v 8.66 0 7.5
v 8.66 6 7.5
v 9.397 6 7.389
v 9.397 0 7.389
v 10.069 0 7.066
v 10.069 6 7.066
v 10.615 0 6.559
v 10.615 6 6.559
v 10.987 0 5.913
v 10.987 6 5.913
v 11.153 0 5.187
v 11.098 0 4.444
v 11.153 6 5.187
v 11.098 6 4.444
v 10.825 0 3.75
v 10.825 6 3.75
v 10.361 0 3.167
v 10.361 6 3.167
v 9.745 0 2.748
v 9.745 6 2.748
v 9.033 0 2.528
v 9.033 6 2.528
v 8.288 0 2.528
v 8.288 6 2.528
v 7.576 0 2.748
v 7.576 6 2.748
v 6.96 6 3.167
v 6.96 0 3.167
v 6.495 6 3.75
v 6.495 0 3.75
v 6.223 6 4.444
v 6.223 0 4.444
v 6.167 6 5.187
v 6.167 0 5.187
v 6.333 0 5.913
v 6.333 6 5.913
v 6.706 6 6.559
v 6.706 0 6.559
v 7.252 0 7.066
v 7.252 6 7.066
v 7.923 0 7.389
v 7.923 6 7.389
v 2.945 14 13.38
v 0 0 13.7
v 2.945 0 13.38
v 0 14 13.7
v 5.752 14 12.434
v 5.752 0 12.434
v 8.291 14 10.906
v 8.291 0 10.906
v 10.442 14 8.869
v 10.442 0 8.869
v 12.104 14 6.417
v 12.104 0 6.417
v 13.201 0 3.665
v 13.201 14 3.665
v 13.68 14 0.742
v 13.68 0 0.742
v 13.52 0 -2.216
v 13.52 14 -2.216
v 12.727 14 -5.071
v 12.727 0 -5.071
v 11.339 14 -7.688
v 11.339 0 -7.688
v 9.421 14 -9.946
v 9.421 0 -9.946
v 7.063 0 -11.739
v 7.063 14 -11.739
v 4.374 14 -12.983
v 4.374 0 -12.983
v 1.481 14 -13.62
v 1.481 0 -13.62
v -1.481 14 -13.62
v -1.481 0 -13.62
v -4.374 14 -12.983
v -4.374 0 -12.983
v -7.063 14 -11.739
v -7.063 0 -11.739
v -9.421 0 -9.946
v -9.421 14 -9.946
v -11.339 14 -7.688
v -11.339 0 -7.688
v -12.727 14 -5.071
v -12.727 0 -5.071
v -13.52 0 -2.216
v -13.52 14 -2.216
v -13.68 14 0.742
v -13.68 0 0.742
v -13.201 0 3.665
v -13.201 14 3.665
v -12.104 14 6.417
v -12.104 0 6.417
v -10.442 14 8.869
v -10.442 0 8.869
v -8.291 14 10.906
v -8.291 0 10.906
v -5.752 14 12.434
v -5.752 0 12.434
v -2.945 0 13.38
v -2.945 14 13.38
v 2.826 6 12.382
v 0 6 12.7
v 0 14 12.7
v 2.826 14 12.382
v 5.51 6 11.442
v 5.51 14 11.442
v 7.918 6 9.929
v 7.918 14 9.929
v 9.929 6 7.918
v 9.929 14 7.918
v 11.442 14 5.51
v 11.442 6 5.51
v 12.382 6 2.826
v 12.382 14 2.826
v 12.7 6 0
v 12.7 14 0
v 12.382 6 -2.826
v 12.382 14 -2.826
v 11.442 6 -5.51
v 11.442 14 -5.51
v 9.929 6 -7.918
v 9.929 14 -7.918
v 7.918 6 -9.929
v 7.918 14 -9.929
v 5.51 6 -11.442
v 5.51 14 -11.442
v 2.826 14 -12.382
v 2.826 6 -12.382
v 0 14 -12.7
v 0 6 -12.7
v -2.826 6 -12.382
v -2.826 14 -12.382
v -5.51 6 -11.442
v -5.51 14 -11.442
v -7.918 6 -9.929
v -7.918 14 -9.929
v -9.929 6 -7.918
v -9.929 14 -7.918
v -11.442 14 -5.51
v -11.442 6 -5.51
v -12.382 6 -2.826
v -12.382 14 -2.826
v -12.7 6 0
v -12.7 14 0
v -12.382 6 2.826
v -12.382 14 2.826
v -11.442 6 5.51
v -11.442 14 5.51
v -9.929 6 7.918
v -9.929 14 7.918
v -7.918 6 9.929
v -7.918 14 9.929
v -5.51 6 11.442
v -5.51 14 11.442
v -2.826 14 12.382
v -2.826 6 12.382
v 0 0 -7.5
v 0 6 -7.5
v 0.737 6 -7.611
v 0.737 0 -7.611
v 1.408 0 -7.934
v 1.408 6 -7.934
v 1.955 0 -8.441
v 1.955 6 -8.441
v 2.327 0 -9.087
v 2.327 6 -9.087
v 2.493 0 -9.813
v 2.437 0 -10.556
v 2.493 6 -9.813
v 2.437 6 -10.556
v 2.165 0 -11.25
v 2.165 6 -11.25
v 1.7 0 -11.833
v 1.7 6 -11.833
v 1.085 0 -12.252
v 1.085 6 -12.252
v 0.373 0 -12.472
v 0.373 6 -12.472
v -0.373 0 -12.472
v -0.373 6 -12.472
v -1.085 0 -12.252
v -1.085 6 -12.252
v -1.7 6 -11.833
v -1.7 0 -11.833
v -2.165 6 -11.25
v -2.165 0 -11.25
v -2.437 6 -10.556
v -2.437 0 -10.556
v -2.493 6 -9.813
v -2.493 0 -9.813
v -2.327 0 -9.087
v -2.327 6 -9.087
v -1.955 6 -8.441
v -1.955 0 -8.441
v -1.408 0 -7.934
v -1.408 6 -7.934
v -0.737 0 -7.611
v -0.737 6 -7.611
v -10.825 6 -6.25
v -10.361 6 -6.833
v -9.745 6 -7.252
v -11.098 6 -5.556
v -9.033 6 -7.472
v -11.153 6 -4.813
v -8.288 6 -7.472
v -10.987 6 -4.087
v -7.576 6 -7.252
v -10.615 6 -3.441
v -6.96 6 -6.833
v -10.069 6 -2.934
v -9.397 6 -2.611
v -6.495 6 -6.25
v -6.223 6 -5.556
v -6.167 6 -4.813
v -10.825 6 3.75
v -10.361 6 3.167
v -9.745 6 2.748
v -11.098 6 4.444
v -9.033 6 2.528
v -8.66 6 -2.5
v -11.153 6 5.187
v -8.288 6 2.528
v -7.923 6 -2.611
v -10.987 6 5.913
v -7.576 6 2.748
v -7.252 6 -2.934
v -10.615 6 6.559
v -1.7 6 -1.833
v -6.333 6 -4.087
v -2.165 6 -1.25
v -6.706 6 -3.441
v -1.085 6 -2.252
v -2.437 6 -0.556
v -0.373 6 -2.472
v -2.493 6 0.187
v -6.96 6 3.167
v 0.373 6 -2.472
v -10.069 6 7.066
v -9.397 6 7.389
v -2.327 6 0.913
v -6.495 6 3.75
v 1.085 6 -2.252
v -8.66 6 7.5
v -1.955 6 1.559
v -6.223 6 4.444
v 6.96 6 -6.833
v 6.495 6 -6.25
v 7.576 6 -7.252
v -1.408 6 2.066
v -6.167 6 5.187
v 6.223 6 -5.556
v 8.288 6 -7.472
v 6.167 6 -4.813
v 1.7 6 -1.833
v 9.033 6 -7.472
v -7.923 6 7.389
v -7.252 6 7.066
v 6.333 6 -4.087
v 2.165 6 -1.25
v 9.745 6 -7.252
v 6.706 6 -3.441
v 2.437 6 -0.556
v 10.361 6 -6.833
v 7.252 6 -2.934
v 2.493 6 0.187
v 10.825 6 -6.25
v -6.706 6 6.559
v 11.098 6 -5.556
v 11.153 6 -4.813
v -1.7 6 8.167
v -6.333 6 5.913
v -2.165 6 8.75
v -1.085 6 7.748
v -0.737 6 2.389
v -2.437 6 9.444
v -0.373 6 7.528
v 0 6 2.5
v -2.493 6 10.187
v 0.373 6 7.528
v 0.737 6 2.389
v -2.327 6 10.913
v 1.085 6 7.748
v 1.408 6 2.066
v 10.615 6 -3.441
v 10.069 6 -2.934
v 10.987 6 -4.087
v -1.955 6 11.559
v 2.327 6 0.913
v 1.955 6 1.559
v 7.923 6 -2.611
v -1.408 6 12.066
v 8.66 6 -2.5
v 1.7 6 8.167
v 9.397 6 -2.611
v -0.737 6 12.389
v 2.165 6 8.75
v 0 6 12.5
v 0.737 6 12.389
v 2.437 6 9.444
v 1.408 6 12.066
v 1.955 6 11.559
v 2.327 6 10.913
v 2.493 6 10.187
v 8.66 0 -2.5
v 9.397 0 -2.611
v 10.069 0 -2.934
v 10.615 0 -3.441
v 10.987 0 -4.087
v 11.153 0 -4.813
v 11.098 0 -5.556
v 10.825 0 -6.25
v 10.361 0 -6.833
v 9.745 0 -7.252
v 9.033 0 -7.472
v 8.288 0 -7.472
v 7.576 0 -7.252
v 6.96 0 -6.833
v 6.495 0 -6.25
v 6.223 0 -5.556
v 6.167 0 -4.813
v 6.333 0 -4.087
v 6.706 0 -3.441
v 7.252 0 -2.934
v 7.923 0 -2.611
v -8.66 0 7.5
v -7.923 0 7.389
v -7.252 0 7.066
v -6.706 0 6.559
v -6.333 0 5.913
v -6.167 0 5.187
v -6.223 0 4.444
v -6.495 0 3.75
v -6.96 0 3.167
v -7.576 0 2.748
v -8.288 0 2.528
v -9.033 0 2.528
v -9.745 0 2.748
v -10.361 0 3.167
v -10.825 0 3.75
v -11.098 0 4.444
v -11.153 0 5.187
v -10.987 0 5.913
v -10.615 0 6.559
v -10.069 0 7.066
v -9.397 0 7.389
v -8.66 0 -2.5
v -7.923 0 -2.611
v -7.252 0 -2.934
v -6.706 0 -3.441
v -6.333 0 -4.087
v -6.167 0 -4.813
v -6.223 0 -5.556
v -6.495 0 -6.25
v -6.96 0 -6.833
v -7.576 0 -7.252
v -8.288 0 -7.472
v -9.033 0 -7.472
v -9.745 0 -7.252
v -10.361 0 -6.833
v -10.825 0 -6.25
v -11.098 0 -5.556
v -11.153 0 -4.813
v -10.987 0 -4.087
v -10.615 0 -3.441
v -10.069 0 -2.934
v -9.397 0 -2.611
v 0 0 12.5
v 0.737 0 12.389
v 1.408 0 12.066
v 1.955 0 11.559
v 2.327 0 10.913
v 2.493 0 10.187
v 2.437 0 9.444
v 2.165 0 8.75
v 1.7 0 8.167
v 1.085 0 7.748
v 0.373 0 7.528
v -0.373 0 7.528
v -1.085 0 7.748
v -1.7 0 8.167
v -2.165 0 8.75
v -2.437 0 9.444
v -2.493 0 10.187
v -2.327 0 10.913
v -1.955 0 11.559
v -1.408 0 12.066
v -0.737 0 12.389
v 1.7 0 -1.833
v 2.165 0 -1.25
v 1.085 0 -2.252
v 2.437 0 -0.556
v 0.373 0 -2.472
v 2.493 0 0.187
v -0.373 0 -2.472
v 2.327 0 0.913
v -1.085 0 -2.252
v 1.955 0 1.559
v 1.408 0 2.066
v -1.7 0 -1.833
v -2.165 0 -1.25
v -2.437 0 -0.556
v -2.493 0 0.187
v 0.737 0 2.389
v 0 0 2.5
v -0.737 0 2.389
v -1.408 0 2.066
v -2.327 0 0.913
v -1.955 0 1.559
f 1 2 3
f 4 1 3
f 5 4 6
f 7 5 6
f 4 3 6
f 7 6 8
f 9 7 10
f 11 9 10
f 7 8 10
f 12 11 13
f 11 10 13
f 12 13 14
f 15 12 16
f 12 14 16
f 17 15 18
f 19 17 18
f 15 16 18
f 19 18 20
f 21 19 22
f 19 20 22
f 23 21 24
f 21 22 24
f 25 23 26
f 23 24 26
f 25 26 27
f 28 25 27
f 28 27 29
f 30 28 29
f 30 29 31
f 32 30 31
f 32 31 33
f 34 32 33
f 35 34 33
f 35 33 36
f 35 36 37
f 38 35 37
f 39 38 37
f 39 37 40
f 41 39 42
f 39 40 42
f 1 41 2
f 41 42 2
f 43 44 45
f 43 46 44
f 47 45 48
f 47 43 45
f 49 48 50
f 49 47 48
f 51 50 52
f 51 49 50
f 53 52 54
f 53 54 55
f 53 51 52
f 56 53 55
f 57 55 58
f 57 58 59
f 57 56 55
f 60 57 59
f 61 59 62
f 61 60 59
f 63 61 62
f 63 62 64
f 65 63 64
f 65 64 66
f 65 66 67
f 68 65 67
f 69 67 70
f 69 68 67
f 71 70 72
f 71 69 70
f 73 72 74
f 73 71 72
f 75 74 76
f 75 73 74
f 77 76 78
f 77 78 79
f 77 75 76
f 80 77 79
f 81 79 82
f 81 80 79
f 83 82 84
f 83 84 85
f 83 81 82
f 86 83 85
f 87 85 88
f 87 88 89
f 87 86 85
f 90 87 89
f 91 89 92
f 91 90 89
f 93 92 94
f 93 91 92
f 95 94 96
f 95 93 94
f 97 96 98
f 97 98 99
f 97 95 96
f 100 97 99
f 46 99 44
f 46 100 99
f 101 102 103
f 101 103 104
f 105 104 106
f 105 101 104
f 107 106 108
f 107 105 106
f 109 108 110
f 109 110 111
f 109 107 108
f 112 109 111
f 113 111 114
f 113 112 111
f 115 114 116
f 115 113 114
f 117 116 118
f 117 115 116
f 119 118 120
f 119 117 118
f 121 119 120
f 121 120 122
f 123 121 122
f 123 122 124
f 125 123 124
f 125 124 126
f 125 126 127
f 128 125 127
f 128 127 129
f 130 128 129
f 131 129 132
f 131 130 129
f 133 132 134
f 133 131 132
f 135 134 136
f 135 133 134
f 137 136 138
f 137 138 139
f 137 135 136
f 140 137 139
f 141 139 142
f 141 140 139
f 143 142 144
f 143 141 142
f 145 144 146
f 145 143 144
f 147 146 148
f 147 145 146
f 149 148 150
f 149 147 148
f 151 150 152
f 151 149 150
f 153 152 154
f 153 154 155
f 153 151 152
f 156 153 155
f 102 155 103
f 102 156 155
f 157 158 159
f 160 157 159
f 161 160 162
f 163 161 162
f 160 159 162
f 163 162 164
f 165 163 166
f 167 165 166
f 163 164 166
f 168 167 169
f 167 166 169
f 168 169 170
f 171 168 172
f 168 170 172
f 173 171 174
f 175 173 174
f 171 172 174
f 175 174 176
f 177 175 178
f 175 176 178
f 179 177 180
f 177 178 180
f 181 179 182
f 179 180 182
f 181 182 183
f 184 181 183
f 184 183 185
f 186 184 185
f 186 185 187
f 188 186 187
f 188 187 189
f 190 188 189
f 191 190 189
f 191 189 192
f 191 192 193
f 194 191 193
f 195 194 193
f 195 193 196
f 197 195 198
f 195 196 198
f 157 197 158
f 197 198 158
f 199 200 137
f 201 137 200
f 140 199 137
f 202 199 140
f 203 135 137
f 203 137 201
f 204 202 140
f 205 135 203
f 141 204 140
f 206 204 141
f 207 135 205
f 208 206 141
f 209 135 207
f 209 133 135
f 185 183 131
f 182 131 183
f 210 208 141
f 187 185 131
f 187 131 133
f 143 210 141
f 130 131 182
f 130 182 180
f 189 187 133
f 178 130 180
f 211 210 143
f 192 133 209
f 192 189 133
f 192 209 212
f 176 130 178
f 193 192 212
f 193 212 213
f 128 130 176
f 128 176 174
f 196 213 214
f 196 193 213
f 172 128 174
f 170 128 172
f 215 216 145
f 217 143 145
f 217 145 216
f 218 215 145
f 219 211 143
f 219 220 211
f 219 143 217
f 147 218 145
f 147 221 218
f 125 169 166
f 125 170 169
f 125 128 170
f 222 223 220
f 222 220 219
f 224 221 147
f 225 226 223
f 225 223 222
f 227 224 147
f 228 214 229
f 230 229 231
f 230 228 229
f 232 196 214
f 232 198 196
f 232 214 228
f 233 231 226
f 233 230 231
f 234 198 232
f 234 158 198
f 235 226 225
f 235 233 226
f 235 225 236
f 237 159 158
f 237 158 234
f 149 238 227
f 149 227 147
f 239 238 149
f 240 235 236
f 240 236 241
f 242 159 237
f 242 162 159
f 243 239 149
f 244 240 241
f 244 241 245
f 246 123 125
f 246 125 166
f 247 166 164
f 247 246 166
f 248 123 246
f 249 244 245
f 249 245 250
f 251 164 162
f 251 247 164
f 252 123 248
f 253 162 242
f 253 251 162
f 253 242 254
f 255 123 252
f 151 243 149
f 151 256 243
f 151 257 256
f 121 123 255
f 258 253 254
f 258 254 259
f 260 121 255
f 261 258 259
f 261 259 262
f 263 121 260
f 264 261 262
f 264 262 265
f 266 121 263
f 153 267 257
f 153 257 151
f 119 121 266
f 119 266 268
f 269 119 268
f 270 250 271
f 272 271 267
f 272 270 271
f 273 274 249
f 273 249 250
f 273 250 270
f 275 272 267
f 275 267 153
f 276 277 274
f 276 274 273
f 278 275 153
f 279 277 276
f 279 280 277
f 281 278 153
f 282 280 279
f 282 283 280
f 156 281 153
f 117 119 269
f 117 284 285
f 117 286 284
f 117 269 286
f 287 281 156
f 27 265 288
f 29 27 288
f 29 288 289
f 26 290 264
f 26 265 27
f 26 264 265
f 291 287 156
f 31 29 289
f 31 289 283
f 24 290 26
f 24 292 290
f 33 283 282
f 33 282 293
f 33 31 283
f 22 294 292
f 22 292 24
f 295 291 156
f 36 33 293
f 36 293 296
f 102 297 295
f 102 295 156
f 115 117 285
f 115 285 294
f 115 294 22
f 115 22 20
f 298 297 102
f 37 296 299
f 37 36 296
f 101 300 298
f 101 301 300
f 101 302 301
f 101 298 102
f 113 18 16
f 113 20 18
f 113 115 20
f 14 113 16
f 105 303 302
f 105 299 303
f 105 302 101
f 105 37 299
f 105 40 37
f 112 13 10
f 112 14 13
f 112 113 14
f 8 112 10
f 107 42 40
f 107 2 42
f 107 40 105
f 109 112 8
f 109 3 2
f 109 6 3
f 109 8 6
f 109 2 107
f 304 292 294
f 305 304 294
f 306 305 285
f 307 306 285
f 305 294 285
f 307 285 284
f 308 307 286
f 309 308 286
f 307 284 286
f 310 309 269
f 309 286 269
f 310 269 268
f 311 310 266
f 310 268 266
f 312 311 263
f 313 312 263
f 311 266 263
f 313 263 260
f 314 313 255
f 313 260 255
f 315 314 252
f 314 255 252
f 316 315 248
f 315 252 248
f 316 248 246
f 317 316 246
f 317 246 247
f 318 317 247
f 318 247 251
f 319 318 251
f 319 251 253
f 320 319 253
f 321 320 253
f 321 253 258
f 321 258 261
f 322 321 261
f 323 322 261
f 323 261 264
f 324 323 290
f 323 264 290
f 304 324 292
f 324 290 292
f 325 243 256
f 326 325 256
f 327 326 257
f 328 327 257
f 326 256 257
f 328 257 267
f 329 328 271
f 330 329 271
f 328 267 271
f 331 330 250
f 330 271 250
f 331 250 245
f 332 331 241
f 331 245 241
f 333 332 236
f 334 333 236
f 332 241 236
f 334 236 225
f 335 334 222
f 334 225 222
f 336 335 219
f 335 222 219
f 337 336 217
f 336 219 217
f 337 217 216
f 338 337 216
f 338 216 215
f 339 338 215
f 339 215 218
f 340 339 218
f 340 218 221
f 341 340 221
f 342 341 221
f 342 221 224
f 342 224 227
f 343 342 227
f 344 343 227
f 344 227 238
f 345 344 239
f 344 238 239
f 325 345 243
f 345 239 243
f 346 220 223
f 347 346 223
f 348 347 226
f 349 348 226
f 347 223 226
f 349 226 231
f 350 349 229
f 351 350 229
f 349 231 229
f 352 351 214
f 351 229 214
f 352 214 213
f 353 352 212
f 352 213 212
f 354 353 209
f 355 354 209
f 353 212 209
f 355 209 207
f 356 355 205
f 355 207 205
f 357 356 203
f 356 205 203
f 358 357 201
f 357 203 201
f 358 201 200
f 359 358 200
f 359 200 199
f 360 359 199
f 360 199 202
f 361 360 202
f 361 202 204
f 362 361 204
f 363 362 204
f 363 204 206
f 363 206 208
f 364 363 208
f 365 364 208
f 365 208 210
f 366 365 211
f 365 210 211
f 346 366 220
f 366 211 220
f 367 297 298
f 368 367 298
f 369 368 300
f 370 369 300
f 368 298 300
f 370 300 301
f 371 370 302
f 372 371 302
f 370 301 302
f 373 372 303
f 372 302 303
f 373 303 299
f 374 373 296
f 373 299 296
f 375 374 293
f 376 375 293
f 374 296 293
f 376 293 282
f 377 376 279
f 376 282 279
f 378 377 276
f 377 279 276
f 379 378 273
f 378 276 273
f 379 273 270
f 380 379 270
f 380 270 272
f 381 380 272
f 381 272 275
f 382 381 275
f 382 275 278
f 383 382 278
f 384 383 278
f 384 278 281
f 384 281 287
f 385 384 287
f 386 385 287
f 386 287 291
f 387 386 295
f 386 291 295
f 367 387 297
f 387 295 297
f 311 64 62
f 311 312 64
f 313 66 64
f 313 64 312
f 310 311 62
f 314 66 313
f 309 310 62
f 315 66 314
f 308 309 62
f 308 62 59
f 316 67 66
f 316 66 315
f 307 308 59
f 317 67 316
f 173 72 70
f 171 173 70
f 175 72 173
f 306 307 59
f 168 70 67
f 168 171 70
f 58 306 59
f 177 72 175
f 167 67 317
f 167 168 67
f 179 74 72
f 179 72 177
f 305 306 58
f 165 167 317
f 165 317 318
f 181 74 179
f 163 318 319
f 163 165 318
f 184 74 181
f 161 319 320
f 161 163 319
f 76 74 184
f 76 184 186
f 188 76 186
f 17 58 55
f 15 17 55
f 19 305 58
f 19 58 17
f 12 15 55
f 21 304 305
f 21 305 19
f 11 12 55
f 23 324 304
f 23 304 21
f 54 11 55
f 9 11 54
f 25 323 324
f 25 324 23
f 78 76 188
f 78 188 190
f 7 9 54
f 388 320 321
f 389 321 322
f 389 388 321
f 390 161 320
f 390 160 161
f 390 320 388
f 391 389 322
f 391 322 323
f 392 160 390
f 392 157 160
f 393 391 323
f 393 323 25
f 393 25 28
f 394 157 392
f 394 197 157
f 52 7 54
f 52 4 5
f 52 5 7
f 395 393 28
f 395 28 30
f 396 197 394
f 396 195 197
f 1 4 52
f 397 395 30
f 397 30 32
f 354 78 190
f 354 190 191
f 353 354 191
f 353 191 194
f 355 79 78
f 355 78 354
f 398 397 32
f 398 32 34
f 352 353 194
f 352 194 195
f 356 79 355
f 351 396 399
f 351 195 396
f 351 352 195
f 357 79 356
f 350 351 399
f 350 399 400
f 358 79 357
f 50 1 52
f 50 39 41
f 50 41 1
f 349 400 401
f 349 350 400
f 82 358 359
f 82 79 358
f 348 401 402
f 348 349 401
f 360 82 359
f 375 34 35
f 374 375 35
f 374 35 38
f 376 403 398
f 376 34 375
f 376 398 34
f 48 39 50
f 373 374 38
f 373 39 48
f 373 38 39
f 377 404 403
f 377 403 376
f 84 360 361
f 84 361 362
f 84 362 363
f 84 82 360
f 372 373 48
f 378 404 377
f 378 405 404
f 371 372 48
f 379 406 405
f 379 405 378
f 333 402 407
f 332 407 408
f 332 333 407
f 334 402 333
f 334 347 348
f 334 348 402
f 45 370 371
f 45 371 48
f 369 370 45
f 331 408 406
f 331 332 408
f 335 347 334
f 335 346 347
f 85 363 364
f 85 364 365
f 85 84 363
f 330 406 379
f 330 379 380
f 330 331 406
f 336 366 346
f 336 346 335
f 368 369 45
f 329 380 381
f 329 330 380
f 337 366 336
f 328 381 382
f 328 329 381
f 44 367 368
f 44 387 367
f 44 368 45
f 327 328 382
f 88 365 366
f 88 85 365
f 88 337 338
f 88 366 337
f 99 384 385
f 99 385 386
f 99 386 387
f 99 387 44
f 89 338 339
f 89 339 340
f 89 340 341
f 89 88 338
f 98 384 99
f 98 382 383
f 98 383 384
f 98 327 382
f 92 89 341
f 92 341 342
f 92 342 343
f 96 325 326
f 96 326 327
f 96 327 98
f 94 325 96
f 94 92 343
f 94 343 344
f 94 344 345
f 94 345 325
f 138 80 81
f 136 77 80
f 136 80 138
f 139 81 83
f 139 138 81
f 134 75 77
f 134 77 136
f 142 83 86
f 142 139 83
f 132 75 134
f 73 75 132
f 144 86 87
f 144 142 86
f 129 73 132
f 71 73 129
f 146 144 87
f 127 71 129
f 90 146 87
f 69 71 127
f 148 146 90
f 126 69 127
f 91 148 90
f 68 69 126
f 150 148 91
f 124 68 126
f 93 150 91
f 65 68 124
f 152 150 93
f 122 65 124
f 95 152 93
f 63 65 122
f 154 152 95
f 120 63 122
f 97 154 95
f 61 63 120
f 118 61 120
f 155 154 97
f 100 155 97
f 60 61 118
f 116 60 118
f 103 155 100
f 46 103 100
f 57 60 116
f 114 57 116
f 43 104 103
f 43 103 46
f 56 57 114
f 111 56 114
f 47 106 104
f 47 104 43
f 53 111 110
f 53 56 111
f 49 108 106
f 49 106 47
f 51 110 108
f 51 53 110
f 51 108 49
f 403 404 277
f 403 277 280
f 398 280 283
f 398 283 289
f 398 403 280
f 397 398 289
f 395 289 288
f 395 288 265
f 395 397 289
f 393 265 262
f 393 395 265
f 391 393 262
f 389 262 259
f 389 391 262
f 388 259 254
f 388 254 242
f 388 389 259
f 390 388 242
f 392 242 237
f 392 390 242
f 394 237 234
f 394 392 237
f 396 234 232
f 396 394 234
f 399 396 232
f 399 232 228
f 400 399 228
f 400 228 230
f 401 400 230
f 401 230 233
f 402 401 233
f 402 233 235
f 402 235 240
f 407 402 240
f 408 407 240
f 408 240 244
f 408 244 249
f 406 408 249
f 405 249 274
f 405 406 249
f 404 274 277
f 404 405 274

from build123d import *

# Parameters (mm, degrees)
SKETCH1_R                       = 13.1
SKETCH1_R_2                     = 2.5
BOSS_EXTRUDE1_DEPTH             = 6
SKETCH2_R                       = 13.7
SKETCH2_R_2                     = 12.7
BOSS_EXTRUDE2_DEPTH             = 8
BOSS_EXTRUDE2_DIRECTION_2_REACH = 21.474
SKETCH7_R                       = 2.5
CUT_EXTRUDE4_DEPTH              = 6


with BuildPart() as part:
    # Sketch1 → Boss-Extrude1 (new body)
    with BuildSketch(Plane(origin=(0, 0, 0), x_dir=(1, 0, 0), z_dir=(0, 1, 0))):
        with Locations(Location((0, 0, 0), (0, 0, 270))):
            Circle(SKETCH1_R)
        with Locations(Location((0, 0, 0), (0, 0, 270))):
            Circle(SKETCH1_R_2, mode=Mode.SUBTRACT)
    extrude(amount=BOSS_EXTRUDE1_DEPTH)

    # Sketch2 → Boss-Extrude2 (add)
    with BuildSketch(Plane(origin=(0, 6, 0), x_dir=(1, 0, 0), z_dir=(0, 1, 0))):
        with Locations(Location((0, 0, 0), (0, 0, 270))):
            Circle(SKETCH2_R)
        with Locations(Location((0, 0, 0), (0, 0, 270))):
            Circle(SKETCH2_R_2, mode=Mode.SUBTRACT)
    extrude(amount=BOSS_EXTRUDE2_DEPTH)

    # Boss-Extrude2 direction 2: up to this face of the body (flat: up to its plane)
    boss_extrude2_direction_2_end = Plane(part.part.faces().sort_by_distance((0, 0, -12.729476047))[0])
    # Sketch2 → Boss-Extrude2 direction 2 (add, up to the picked face)
    with BuildSketch(Plane(origin=(0, 6, 0), x_dir=(1, 0, 0), z_dir=(0, 1, 0)), mode=Mode.PRIVATE) as boss_extrude2_direction_2_sk1:
        with Locations(Location((0, 0, 0), (0, 0, 270))):
            Circle(SKETCH2_R)
        with Locations(Location((0, 0, 0), (0, 0, 270))):
            Circle(SKETCH2_R_2, mode=Mode.SUBTRACT)
    boss_extrude2_direction_2_tool1 = split(extrude(boss_extrude2_direction_2_sk1.sketch, amount=-BOSS_EXTRUDE2_DIRECTION_2_REACH, mode=Mode.PRIVATE), bisect_by=boss_extrude2_direction_2_end, keep=Keep.BOTH, mode=Mode.PRIVATE)
    add(boss_extrude2_direction_2_tool1.solids().sort_by(Axis((0, 6, -13.312505), (0, -1, 0)))[0])

    # Sketch7 → Cut-Extrude4 (cut)
    with BuildSketch(Plane(origin=(0, 6, 0), x_dir=(1, 0, 0), z_dir=(0, 1, 0))):
        with Locations(Location((0, 10, 0), (0, 0, 270))):
            Circle(SKETCH7_R)
        with Locations(Location((8.660254038, 5, 0), (0, 0, 270))):
            Circle(SKETCH7_R)
        with Locations(Location((8.660254038, -5, 0), (0, 0, 270))):
            Circle(SKETCH7_R)
        with Locations(Location((0, -10, 0), (0, 0, 270))):
            Circle(SKETCH7_R)
        with Locations(Location((-8.660254038, -5, 0), (0, 0, 270))):
            Circle(SKETCH7_R)
        with Locations(Location((-8.660254038, 5, 0), (0, 0, 270))):
            Circle(SKETCH7_R)
    extrude(amount=-CUT_EXTRUDE4_DEPTH, mode=Mode.SUBTRACT)


solid = part.part
